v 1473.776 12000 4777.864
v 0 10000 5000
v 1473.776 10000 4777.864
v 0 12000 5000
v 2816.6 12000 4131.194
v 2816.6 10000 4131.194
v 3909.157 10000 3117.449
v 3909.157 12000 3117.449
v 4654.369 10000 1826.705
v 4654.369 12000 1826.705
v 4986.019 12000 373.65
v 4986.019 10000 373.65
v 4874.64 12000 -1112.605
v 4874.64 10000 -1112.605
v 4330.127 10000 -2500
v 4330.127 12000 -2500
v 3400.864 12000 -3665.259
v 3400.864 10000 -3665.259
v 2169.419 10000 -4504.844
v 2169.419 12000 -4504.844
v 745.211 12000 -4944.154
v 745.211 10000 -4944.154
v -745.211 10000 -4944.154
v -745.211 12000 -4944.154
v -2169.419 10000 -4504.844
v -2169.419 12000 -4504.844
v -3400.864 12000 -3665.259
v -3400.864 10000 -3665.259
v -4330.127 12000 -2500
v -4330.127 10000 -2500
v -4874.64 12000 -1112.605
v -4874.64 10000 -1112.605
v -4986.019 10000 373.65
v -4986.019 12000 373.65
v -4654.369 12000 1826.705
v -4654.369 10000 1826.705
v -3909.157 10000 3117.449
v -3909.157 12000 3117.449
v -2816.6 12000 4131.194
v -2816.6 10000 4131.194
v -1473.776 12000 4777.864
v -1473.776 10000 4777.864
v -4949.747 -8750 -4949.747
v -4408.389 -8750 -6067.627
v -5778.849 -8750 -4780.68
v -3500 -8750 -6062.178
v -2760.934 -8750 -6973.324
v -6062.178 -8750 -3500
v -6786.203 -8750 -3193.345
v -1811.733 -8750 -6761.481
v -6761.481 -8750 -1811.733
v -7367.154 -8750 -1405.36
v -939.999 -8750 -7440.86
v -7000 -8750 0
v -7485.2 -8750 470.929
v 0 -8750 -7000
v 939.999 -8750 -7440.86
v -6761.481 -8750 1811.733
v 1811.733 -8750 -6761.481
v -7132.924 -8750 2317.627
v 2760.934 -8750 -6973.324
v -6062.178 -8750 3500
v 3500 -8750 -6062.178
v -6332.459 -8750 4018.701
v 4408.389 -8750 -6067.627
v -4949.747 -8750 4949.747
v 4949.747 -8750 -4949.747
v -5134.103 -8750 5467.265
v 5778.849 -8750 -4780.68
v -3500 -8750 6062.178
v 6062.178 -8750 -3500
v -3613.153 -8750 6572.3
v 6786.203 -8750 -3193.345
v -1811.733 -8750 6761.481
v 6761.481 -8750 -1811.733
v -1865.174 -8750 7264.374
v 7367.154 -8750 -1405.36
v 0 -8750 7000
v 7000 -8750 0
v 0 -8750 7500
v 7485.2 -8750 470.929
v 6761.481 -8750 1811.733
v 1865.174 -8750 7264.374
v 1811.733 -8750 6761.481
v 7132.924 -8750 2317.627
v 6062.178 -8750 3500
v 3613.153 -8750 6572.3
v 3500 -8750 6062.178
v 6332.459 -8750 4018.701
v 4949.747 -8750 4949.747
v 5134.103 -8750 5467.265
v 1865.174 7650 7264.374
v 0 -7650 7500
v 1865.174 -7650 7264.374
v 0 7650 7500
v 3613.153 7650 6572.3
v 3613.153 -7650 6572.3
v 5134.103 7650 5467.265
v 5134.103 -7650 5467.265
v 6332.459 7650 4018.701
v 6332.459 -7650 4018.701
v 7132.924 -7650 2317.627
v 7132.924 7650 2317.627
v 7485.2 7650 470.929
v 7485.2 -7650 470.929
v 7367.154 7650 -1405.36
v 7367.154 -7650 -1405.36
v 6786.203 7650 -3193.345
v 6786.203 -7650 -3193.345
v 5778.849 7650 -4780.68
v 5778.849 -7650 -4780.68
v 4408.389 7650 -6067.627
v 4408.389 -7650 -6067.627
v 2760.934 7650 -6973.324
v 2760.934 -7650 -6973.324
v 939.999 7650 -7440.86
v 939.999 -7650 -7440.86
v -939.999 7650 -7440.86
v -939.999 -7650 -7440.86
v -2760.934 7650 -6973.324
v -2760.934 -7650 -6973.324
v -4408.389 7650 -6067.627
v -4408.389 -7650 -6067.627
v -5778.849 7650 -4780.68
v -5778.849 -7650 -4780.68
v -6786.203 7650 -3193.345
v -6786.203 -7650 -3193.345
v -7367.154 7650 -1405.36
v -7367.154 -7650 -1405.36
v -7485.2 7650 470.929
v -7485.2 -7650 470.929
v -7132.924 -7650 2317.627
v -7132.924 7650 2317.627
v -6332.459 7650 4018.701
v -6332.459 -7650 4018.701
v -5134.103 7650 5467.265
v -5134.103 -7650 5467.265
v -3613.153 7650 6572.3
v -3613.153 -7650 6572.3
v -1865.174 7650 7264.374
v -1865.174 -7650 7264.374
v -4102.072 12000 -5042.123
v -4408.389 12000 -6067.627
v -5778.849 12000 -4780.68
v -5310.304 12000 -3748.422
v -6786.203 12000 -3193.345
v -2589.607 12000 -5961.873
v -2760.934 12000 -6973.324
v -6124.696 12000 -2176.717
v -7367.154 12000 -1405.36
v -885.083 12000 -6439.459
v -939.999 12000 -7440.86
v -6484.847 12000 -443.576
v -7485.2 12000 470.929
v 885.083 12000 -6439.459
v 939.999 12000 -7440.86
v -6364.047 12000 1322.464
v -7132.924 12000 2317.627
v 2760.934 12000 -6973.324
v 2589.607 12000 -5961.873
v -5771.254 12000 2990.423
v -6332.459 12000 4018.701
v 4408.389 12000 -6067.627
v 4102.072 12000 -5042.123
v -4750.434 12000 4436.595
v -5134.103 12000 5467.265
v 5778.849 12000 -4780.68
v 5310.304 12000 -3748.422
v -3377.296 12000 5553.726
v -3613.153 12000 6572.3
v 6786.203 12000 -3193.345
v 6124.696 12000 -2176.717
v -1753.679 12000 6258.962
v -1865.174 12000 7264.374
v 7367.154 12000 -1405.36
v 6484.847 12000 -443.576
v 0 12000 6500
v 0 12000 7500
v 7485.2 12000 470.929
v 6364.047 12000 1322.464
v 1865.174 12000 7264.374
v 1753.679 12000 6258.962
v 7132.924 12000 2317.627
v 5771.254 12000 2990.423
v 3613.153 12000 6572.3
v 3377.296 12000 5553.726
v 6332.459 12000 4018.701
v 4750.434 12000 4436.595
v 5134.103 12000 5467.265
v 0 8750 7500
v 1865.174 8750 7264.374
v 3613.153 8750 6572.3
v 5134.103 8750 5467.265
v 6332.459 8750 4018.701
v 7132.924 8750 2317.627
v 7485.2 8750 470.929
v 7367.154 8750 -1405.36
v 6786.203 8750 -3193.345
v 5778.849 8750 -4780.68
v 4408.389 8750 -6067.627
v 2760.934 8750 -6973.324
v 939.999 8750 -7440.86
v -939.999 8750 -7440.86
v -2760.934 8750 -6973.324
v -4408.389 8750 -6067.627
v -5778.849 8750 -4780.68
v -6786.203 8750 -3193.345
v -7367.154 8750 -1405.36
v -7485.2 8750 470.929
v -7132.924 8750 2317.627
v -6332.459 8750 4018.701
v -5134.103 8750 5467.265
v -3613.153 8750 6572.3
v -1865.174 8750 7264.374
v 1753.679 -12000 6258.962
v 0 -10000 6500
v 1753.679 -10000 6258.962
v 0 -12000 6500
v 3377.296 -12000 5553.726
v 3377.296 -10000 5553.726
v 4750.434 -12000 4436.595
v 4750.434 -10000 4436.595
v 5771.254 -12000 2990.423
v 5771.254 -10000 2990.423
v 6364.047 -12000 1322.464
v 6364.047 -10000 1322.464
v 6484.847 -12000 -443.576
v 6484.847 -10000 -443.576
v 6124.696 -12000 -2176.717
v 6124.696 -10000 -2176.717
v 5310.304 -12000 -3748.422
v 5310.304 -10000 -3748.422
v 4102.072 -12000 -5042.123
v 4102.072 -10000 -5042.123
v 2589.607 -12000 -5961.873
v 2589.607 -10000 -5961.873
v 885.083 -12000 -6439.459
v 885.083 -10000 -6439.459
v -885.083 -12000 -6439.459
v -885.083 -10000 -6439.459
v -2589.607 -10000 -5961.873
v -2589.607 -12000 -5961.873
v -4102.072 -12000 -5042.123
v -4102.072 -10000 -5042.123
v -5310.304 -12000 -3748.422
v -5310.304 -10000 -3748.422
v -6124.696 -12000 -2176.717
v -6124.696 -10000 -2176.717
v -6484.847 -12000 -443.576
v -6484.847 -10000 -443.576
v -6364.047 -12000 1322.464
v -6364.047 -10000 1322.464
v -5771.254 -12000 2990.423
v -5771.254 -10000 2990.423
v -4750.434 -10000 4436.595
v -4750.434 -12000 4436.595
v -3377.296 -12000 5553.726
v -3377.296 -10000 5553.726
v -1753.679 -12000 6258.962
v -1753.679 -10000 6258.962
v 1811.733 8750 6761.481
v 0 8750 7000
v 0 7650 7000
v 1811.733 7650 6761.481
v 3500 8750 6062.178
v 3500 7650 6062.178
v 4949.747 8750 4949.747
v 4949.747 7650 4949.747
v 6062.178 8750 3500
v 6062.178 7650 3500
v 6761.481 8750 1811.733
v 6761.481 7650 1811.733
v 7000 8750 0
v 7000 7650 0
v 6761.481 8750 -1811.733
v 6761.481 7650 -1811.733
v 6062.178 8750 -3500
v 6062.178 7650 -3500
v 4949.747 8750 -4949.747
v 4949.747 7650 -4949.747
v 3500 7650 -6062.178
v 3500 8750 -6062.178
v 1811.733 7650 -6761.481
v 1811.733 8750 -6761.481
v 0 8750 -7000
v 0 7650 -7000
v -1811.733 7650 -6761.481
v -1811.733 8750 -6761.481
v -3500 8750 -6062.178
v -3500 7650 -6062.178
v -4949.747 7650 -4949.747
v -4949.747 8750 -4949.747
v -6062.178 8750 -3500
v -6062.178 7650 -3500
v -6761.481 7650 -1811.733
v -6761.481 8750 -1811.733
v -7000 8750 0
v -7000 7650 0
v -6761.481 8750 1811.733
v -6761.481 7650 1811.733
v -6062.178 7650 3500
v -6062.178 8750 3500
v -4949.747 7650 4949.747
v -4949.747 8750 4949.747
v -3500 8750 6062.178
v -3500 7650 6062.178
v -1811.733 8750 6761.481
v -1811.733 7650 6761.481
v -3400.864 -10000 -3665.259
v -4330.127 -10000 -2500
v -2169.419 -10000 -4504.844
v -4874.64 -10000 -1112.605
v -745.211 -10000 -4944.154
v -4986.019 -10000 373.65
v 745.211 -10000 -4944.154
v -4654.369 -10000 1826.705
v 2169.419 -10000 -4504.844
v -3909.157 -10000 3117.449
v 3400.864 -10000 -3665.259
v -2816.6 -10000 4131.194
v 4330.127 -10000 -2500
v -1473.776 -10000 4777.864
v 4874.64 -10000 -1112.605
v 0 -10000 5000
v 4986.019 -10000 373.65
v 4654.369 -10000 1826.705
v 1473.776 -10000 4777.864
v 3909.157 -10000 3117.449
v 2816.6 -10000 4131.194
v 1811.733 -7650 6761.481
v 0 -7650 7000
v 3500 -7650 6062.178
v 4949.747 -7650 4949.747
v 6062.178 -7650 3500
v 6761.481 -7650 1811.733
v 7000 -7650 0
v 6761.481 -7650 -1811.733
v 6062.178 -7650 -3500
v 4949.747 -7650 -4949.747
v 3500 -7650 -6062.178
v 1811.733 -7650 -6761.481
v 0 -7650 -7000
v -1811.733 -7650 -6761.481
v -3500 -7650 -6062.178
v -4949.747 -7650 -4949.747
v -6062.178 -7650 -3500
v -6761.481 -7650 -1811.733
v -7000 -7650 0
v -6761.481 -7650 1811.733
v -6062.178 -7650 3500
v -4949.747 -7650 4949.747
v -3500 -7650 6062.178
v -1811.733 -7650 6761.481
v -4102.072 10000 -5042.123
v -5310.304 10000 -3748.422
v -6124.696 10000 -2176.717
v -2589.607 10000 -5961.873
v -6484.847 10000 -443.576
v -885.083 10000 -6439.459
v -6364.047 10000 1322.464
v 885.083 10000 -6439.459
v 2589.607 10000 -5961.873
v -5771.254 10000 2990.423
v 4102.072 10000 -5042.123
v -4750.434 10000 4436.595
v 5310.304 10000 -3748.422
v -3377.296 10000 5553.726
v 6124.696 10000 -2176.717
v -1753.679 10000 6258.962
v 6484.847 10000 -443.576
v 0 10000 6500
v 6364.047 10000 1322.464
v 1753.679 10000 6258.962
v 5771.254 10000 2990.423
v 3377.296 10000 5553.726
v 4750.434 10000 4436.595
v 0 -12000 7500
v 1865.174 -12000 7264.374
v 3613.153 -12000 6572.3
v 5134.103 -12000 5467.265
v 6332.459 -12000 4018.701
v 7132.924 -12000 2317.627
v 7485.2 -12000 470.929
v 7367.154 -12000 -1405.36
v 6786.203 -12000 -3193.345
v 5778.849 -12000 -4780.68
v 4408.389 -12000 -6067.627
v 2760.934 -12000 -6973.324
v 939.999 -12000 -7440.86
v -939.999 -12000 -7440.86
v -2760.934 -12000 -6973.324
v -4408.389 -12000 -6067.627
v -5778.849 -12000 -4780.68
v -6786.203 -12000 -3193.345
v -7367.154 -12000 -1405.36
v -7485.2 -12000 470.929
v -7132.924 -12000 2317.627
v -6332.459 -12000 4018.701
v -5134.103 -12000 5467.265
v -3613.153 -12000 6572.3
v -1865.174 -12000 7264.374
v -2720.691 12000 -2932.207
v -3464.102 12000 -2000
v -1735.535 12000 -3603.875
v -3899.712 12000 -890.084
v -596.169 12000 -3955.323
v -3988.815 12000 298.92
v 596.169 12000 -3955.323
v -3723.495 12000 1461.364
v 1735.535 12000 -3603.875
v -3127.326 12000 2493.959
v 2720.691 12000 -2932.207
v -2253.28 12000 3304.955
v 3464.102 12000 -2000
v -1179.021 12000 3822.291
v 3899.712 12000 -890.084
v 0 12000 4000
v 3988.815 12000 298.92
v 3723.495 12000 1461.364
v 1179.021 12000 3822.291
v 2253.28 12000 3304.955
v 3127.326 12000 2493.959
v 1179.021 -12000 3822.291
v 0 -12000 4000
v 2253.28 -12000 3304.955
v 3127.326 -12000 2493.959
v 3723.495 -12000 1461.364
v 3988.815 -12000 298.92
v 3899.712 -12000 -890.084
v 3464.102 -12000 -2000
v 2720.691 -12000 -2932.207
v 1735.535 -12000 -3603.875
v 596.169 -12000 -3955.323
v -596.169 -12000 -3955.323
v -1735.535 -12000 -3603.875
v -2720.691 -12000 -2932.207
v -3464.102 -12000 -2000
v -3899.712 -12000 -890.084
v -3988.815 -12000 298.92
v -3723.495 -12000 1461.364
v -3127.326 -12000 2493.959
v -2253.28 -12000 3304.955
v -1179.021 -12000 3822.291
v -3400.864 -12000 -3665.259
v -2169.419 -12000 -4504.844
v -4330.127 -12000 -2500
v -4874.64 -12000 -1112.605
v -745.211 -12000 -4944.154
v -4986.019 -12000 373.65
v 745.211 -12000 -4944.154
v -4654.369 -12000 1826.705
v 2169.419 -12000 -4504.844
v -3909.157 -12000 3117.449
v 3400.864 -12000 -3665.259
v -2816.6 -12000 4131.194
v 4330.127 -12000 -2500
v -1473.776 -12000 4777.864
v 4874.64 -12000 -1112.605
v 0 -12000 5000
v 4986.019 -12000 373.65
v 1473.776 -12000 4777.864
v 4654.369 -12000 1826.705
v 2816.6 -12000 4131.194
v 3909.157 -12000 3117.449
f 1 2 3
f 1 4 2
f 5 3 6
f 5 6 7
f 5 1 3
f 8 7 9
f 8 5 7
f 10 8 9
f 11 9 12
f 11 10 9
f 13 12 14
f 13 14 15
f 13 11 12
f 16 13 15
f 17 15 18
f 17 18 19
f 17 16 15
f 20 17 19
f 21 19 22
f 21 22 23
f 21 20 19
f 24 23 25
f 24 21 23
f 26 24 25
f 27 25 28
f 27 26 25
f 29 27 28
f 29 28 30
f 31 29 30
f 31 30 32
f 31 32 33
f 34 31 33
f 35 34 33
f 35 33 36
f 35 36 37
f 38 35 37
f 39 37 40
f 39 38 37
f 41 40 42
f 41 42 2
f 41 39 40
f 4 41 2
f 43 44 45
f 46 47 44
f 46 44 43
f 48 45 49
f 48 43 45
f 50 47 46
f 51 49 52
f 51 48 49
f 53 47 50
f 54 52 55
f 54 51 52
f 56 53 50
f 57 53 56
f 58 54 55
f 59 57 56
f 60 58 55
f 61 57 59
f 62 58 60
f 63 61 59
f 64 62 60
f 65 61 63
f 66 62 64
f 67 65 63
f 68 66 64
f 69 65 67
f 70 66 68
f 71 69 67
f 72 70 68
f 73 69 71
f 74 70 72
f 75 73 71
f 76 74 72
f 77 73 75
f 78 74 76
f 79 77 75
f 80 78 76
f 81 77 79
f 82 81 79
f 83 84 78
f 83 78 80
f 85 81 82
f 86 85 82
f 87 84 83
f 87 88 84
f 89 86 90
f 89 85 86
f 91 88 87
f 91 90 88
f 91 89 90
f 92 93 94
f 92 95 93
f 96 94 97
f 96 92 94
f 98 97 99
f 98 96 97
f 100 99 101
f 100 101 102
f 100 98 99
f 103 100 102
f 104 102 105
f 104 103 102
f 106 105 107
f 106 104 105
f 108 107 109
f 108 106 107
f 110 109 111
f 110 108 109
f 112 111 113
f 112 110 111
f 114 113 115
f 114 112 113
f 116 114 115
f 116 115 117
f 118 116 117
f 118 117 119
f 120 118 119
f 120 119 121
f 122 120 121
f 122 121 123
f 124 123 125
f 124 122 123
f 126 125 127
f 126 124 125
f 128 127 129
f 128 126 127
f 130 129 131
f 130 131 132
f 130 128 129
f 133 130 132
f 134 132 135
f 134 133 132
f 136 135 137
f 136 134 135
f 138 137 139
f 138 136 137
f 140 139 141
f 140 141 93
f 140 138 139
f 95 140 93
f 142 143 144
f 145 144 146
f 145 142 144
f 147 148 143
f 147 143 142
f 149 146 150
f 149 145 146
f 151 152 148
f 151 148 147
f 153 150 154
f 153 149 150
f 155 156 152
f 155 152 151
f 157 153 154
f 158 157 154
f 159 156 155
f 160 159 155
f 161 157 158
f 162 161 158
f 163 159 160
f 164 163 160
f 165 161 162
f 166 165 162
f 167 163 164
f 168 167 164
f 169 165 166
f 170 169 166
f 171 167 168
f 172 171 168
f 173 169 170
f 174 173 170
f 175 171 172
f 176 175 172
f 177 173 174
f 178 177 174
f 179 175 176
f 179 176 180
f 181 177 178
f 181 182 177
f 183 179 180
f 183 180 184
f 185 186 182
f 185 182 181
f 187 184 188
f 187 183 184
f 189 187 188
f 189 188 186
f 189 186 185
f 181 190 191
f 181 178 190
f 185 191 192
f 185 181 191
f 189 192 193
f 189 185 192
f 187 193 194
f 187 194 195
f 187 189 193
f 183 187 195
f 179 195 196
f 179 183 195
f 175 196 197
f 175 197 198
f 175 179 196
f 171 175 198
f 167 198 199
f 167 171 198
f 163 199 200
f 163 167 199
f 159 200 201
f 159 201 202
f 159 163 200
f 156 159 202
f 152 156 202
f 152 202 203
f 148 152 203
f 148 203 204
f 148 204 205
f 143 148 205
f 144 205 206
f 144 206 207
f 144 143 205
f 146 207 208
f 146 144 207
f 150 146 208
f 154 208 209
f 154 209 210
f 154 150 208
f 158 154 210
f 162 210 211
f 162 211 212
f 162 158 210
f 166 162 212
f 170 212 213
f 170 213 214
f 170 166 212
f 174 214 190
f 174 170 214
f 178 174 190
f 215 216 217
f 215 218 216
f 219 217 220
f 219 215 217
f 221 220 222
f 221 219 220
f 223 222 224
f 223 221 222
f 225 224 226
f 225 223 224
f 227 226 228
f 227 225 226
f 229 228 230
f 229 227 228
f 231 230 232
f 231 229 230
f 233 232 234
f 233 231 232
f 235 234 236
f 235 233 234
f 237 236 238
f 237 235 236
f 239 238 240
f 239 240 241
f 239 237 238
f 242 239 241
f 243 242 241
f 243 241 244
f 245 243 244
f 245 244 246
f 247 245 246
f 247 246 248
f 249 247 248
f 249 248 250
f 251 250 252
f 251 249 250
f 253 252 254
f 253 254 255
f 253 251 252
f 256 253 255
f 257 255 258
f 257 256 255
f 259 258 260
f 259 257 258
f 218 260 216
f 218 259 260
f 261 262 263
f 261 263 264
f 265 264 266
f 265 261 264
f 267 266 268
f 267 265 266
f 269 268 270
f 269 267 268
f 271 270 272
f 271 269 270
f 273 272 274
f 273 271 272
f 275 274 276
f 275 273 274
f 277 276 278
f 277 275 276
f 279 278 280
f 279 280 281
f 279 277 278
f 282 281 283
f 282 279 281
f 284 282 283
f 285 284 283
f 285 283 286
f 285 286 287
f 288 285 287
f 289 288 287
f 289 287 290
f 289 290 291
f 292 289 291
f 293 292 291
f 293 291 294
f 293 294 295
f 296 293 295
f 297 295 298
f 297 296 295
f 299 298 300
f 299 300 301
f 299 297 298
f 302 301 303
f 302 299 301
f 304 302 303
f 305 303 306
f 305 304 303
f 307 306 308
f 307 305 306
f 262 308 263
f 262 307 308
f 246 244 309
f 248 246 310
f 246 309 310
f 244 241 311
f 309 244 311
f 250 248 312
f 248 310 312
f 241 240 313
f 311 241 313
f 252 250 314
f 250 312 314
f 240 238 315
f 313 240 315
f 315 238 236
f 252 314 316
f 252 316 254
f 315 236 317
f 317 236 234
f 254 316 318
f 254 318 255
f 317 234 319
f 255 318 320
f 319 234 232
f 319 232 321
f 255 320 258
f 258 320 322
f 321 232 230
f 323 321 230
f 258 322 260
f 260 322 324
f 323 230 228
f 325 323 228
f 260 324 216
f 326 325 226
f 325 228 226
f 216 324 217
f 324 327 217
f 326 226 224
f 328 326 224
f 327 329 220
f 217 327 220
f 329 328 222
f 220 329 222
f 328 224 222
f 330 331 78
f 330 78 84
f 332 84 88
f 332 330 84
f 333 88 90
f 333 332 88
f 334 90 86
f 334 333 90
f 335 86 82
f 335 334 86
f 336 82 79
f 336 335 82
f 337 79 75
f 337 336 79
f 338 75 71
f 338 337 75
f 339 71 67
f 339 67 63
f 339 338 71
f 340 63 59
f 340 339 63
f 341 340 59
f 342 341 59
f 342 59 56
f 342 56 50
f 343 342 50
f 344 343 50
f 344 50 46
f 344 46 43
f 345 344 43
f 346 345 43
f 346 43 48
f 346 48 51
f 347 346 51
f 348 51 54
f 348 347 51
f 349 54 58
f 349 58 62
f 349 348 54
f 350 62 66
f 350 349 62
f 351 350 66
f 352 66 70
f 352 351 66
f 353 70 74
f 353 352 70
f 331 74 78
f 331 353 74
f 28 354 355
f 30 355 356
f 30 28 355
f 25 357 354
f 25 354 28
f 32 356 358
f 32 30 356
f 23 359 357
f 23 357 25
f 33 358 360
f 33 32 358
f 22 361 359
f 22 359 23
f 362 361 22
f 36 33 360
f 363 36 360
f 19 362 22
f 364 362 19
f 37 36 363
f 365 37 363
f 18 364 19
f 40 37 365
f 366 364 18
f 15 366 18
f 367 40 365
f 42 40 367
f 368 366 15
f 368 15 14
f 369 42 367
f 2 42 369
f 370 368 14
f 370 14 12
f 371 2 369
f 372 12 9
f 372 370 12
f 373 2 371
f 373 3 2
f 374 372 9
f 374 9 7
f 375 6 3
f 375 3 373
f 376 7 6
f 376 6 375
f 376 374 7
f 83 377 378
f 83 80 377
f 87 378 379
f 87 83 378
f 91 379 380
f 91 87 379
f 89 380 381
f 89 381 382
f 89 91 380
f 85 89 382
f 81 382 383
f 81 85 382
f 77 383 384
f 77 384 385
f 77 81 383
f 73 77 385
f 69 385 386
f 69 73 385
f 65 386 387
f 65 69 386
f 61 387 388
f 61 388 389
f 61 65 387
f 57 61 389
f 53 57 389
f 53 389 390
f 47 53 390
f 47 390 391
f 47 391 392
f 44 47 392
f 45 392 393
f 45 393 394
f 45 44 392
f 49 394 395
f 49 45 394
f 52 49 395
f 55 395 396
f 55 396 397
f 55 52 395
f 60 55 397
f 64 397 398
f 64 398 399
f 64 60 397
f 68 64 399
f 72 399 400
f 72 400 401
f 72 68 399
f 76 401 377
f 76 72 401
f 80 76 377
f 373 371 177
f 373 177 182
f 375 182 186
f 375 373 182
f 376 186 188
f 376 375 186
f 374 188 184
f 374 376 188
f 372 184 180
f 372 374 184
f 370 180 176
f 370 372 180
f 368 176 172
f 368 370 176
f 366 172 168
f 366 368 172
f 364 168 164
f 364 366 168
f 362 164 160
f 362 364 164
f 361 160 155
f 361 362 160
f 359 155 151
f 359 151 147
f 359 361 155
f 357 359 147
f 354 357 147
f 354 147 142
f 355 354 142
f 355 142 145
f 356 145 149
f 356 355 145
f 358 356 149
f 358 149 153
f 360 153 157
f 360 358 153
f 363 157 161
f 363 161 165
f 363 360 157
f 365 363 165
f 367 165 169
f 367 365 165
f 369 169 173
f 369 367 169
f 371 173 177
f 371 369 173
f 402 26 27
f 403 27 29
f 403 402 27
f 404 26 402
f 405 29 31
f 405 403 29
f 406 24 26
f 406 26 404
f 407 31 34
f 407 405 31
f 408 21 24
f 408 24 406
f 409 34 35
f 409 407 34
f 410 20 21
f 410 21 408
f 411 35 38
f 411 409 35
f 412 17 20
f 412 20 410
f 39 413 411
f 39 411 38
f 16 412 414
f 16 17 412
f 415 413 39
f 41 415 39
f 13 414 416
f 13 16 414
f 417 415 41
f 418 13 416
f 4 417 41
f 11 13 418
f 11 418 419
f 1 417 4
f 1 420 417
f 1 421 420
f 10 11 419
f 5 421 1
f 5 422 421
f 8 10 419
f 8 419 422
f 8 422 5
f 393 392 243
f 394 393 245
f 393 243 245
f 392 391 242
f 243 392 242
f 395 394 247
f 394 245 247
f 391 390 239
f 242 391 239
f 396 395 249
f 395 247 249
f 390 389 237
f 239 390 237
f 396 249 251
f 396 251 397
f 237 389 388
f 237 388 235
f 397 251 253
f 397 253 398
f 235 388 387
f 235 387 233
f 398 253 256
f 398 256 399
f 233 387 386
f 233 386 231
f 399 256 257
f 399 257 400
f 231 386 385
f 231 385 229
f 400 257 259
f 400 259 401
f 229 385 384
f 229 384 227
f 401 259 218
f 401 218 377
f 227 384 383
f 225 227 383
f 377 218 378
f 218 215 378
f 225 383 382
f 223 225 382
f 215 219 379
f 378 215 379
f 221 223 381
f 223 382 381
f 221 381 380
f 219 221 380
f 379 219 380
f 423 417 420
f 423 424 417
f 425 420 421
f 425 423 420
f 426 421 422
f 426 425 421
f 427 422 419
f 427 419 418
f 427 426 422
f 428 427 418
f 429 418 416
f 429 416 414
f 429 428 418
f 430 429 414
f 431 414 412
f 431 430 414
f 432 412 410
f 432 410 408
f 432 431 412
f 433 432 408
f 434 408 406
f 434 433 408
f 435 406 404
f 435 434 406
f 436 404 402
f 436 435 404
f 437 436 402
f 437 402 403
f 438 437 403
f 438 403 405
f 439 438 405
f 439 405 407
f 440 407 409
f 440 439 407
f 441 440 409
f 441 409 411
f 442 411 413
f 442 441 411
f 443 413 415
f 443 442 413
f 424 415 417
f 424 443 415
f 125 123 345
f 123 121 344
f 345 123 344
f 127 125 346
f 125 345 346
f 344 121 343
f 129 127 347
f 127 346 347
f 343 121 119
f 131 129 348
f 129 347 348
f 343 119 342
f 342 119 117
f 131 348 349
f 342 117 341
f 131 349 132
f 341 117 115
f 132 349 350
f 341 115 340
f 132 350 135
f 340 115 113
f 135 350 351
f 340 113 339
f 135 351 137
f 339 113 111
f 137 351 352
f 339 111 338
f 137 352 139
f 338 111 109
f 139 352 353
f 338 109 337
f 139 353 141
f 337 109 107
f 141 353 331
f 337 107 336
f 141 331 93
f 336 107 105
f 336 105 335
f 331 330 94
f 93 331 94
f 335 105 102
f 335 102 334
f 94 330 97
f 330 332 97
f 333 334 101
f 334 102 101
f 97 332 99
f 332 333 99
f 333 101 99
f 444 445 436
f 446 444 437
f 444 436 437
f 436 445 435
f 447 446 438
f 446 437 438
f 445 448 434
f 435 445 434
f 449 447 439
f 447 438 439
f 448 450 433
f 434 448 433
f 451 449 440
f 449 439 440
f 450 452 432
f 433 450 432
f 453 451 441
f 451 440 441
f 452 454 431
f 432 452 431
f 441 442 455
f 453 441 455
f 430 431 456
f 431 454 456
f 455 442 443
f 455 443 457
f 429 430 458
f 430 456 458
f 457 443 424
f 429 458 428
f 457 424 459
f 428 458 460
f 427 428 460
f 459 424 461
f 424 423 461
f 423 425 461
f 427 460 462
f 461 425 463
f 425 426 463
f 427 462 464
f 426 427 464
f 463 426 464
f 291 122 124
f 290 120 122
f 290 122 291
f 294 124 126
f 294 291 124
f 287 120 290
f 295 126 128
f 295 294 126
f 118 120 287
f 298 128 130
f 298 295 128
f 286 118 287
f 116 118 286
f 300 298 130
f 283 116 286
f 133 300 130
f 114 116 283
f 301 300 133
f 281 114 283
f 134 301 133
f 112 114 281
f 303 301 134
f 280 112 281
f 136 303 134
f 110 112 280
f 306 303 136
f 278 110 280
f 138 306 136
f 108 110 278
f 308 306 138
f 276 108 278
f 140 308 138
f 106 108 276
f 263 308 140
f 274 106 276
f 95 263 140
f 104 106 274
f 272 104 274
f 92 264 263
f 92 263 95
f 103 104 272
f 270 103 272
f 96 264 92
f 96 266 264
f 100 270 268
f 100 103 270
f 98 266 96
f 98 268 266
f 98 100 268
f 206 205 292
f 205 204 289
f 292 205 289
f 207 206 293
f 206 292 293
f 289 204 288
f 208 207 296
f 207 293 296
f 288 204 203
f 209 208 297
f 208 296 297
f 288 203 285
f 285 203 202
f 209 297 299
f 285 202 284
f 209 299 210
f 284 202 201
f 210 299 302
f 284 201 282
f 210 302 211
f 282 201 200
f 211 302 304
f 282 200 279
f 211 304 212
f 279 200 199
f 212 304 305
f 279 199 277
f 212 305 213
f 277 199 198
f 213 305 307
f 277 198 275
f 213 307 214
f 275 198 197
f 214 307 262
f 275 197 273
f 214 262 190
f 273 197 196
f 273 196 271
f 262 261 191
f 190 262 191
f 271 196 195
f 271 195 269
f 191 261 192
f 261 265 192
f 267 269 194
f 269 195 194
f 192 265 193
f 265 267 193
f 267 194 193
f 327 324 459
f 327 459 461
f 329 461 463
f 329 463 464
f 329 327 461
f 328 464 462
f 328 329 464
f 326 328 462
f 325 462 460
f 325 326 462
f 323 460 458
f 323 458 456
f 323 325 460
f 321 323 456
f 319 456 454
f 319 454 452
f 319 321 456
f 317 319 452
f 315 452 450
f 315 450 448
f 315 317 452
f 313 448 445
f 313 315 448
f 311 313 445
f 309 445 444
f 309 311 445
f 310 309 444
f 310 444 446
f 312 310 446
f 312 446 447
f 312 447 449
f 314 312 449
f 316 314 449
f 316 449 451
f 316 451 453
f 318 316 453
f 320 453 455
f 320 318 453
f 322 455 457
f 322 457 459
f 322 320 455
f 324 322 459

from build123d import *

# Parameters (mm, degrees)
SKETCH_1_R          = 7500
SKETCH_1_R_2        = 6500
EXTRUDE_1_DEPTH     = 12000
SKETCH_1_5_R        = 5000
SKETCH_1_5_R_2      = 4000
EXTRUDE_3_DEPTH     = 12000
SKETCH_1_6_R        = 6500
SKETCH_1_6_R_2      = 5000
EXTRUDE_4_DEPTH     = 10000
CUT_EXTRUDE_START   = 1100
SKETCH_3_R          = 7500
SKETCH_3_R_2        = 7000
CUT_EXTRUDE_1_DEPTH = 1100
SKETCH_4_R          = 7500
SKETCH_4_R_2        = 7000
CUT_EXTRUDE_2_DEPTH = 1100


with BuildPart() as part:
    # 草圖1 → 填料-伸長1 (new, symmetric)
    with BuildSketch(Plane(origin=(0, 0, 0), x_dir=(1, 0, 0), z_dir=(0, 1, 0))):
        Circle(SKETCH_1_R)
        Circle(SKETCH_1_R_2, mode=Mode.SUBTRACT)
    extrude(amount=EXTRUDE_1_DEPTH, both=True)



with BuildPart() as body_2:
    # 草圖1<5> → 填料-伸長3 (new, symmetric)
    with BuildSketch(Plane(origin=(0, 0, 0), x_dir=(1, 0, 0), z_dir=(0, 1, 0))):
        Circle(SKETCH_1_5_R)
        Circle(SKETCH_1_5_R_2, mode=Mode.SUBTRACT)
    extrude(amount=EXTRUDE_3_DEPTH, both=True)


with BuildPart() as part_1:
    add(part.part)

    add(body_2.part)  # 填料-伸長4 merges body 2
    # 草圖1<6> → 填料-伸長4 (add, symmetric)
    with BuildSketch(Plane(origin=(0, 0, 0), x_dir=(1, 0, 0), z_dir=(0, 1, 0))):
        Circle(SKETCH_1_6_R)
        Circle(SKETCH_1_6_R_2, mode=Mode.SUBTRACT)
    extrude(amount=EXTRUDE_4_DEPTH, both=True)

    # 草圖3 → 除料-伸長1 (cut)
    with BuildSketch(Plane(origin=(0, 7650, 0), x_dir=(1, 0, 0), z_dir=(0, 1, 0)).offset(CUT_EXTRUDE_START)):
        Circle(SKETCH_3_R)
        Circle(SKETCH_3_R_2, mode=Mode.SUBTRACT)
    extrude(amount=-CUT_EXTRUDE_1_DEPTH, mode=Mode.SUBTRACT)

    # 草圖4 → 除料-伸長2 (cut)
    with BuildSketch(Plane(origin=(0, -7650, 0), x_dir=(1, 0, 0), z_dir=(0, 1, 0))):
        Circle(SKETCH_4_R)
        Circle(SKETCH_4_R_2, mode=Mode.SUBTRACT)
    extrude(amount=-CUT_EXTRUDE_2_DEPTH, mode=Mode.SUBTRACT)


solid = part_1.part
